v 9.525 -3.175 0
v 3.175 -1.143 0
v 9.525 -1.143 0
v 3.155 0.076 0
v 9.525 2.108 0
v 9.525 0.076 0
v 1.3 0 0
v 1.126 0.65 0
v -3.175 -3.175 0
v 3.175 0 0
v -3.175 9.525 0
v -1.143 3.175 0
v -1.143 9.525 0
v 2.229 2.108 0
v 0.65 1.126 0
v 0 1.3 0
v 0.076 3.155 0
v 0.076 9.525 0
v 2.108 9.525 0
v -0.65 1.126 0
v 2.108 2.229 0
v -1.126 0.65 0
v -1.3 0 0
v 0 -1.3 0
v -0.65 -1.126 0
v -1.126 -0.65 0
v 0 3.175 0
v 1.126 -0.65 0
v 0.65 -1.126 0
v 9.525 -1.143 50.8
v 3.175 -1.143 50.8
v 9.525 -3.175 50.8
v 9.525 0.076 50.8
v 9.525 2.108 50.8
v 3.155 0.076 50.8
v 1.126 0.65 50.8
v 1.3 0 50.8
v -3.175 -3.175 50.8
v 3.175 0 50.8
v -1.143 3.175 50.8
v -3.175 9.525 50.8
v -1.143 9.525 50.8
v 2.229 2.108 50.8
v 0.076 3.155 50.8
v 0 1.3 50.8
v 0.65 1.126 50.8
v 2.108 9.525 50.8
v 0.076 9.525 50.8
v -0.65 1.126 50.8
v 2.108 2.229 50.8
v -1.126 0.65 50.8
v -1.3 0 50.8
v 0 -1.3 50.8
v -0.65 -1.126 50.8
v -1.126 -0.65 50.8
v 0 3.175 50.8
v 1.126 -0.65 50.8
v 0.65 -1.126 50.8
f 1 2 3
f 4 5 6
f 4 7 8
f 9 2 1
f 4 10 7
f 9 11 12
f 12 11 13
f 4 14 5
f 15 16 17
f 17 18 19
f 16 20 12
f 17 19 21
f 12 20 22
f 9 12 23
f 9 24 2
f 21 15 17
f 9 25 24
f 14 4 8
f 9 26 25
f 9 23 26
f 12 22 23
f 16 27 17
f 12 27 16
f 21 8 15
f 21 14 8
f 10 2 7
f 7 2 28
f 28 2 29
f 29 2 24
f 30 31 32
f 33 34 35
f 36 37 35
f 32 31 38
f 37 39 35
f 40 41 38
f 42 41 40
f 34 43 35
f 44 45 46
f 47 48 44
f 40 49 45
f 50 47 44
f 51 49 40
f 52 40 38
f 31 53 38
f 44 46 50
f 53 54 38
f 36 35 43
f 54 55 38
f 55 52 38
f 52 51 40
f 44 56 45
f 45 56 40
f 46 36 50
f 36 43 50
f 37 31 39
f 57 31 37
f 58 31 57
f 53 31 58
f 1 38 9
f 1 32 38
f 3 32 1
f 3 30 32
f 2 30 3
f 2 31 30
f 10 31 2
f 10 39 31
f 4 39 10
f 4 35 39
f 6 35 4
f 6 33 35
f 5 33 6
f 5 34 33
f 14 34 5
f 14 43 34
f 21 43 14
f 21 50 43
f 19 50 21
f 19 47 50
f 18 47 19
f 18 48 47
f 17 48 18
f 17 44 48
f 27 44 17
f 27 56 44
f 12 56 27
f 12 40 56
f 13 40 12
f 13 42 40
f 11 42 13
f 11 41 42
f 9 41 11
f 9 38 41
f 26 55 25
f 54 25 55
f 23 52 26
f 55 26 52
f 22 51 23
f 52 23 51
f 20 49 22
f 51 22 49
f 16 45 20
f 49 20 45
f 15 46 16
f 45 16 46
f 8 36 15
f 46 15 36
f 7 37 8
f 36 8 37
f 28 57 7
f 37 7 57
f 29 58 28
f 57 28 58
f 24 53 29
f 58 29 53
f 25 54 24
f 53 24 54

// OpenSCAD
module corner(
    square_size, square_diameter, 
    wall_spacing, wall_length, wall_width)
{
    /* Calculate required intermediate variables
     */
    square_radius = square_diameter / 2;
    wall_offset_lateral = (square_size / 2) - (wall_spacing / 2) - wall_width;
    wall_length_adjusted = wall_length - square_radius;

    /* Define the walls intended to hold the case sides.
     */
    module _walls(length, width, spacing)
    {
        translate(v=[length / 2, -((width + spacing)/2), 0])
            square([length, width], true);
        translate(v=[length / 2,  ((width + spacing)/2), 0])
            square([length, width], true);
    }

    /* Define a square with a couple of rounded corners.
     */
    module _rounded_square(size)
    {
        hull() {
            circle(d = size, center = true);
            translate([-(size / 4),  (size / 4)])
                square(size / 2, center = true);
            translate([ (size / 4), -(size / 4)])
                square(size / 2, center = true);
            translate([-(size / 4), -(size / 4)])
                square(size / 2, center = true);
        }
    }

    /* Define the object that makes up the corner
     * with the hole.
     */
    module _corner(size, radius)
    {
        difference() {
            _rounded_square(size);
            circle(d = radius, center = true);
        }
    }

    /* Define the complete object.
     */
    union() {
        _corner(square_size, square_diameter);
        translate(v=[square_radius, -wall_offset_lateral, 0])
            rotate([0, 0, 0])
                _walls(wall_length_adjusted, wall_width, wall_spacing);
        translate(v=[-wall_offset_lateral, square_radius, 0])
            rotate([0, 0, 90])
                _walls(wall_length_adjusted, wall_width, wall_spacing);
    }
}

/* Main routine.
 */
module main() 
{
    /* Define the scales used for exporting the object.
     * Each value converts a measure to mm.
     *
     * These values are particular to the Solidoodle, which 
     * makes each voxel = 1 mm^3.  If you have a printer that
     * uses a different value they will have to be adjusted.
     *
     * Note:  scale is an operation applied to the figure, not a 
     *        setting for the program.  That's why there's no 
     *        semicolon after the command.
     */
    SCALE_64_TO_MM   = 25.4 / 64;
    SCALE_MILS_TO_MM = 25.4 / 1000;
    SCALE_MM_TO_MM   = 1.0;
    SCALE_CM_TO_MM   = 10.0;
    SCALE_IN_TO_MM   = 25.4;

    /* Set the number of segments used to render a cylinder.
     */ 
    $fn = 12;   // 12 segments for a cylinder

    /* Parametric values defining the object.
     */
    wall_spacing    = 48 * SCALE_MILS_TO_MM;    // spacing between the guide walls
    wall_width      = 80 * SCALE_MILS_TO_MM;    // guide wall thickness
    wall_length     = .375 * SCALE_IN_TO_MM;    // guide wall length

    corner_size     = .25 * SCALE_IN_TO_MM;     // corner wall size (must be bigger than diameter)
    corner_diameter = 2.6 * SCALE_MM_TO_MM;     // corner hole diameter
 
     /* Create the object.
     */
    linear_extrude(height=2 * SCALE_IN_TO_MM)
    {
        corner(
            corner_size, corner_diameter, 
            wall_spacing, wall_length, wall_width);
    }
}

/* Call main routine.
 */
main();
